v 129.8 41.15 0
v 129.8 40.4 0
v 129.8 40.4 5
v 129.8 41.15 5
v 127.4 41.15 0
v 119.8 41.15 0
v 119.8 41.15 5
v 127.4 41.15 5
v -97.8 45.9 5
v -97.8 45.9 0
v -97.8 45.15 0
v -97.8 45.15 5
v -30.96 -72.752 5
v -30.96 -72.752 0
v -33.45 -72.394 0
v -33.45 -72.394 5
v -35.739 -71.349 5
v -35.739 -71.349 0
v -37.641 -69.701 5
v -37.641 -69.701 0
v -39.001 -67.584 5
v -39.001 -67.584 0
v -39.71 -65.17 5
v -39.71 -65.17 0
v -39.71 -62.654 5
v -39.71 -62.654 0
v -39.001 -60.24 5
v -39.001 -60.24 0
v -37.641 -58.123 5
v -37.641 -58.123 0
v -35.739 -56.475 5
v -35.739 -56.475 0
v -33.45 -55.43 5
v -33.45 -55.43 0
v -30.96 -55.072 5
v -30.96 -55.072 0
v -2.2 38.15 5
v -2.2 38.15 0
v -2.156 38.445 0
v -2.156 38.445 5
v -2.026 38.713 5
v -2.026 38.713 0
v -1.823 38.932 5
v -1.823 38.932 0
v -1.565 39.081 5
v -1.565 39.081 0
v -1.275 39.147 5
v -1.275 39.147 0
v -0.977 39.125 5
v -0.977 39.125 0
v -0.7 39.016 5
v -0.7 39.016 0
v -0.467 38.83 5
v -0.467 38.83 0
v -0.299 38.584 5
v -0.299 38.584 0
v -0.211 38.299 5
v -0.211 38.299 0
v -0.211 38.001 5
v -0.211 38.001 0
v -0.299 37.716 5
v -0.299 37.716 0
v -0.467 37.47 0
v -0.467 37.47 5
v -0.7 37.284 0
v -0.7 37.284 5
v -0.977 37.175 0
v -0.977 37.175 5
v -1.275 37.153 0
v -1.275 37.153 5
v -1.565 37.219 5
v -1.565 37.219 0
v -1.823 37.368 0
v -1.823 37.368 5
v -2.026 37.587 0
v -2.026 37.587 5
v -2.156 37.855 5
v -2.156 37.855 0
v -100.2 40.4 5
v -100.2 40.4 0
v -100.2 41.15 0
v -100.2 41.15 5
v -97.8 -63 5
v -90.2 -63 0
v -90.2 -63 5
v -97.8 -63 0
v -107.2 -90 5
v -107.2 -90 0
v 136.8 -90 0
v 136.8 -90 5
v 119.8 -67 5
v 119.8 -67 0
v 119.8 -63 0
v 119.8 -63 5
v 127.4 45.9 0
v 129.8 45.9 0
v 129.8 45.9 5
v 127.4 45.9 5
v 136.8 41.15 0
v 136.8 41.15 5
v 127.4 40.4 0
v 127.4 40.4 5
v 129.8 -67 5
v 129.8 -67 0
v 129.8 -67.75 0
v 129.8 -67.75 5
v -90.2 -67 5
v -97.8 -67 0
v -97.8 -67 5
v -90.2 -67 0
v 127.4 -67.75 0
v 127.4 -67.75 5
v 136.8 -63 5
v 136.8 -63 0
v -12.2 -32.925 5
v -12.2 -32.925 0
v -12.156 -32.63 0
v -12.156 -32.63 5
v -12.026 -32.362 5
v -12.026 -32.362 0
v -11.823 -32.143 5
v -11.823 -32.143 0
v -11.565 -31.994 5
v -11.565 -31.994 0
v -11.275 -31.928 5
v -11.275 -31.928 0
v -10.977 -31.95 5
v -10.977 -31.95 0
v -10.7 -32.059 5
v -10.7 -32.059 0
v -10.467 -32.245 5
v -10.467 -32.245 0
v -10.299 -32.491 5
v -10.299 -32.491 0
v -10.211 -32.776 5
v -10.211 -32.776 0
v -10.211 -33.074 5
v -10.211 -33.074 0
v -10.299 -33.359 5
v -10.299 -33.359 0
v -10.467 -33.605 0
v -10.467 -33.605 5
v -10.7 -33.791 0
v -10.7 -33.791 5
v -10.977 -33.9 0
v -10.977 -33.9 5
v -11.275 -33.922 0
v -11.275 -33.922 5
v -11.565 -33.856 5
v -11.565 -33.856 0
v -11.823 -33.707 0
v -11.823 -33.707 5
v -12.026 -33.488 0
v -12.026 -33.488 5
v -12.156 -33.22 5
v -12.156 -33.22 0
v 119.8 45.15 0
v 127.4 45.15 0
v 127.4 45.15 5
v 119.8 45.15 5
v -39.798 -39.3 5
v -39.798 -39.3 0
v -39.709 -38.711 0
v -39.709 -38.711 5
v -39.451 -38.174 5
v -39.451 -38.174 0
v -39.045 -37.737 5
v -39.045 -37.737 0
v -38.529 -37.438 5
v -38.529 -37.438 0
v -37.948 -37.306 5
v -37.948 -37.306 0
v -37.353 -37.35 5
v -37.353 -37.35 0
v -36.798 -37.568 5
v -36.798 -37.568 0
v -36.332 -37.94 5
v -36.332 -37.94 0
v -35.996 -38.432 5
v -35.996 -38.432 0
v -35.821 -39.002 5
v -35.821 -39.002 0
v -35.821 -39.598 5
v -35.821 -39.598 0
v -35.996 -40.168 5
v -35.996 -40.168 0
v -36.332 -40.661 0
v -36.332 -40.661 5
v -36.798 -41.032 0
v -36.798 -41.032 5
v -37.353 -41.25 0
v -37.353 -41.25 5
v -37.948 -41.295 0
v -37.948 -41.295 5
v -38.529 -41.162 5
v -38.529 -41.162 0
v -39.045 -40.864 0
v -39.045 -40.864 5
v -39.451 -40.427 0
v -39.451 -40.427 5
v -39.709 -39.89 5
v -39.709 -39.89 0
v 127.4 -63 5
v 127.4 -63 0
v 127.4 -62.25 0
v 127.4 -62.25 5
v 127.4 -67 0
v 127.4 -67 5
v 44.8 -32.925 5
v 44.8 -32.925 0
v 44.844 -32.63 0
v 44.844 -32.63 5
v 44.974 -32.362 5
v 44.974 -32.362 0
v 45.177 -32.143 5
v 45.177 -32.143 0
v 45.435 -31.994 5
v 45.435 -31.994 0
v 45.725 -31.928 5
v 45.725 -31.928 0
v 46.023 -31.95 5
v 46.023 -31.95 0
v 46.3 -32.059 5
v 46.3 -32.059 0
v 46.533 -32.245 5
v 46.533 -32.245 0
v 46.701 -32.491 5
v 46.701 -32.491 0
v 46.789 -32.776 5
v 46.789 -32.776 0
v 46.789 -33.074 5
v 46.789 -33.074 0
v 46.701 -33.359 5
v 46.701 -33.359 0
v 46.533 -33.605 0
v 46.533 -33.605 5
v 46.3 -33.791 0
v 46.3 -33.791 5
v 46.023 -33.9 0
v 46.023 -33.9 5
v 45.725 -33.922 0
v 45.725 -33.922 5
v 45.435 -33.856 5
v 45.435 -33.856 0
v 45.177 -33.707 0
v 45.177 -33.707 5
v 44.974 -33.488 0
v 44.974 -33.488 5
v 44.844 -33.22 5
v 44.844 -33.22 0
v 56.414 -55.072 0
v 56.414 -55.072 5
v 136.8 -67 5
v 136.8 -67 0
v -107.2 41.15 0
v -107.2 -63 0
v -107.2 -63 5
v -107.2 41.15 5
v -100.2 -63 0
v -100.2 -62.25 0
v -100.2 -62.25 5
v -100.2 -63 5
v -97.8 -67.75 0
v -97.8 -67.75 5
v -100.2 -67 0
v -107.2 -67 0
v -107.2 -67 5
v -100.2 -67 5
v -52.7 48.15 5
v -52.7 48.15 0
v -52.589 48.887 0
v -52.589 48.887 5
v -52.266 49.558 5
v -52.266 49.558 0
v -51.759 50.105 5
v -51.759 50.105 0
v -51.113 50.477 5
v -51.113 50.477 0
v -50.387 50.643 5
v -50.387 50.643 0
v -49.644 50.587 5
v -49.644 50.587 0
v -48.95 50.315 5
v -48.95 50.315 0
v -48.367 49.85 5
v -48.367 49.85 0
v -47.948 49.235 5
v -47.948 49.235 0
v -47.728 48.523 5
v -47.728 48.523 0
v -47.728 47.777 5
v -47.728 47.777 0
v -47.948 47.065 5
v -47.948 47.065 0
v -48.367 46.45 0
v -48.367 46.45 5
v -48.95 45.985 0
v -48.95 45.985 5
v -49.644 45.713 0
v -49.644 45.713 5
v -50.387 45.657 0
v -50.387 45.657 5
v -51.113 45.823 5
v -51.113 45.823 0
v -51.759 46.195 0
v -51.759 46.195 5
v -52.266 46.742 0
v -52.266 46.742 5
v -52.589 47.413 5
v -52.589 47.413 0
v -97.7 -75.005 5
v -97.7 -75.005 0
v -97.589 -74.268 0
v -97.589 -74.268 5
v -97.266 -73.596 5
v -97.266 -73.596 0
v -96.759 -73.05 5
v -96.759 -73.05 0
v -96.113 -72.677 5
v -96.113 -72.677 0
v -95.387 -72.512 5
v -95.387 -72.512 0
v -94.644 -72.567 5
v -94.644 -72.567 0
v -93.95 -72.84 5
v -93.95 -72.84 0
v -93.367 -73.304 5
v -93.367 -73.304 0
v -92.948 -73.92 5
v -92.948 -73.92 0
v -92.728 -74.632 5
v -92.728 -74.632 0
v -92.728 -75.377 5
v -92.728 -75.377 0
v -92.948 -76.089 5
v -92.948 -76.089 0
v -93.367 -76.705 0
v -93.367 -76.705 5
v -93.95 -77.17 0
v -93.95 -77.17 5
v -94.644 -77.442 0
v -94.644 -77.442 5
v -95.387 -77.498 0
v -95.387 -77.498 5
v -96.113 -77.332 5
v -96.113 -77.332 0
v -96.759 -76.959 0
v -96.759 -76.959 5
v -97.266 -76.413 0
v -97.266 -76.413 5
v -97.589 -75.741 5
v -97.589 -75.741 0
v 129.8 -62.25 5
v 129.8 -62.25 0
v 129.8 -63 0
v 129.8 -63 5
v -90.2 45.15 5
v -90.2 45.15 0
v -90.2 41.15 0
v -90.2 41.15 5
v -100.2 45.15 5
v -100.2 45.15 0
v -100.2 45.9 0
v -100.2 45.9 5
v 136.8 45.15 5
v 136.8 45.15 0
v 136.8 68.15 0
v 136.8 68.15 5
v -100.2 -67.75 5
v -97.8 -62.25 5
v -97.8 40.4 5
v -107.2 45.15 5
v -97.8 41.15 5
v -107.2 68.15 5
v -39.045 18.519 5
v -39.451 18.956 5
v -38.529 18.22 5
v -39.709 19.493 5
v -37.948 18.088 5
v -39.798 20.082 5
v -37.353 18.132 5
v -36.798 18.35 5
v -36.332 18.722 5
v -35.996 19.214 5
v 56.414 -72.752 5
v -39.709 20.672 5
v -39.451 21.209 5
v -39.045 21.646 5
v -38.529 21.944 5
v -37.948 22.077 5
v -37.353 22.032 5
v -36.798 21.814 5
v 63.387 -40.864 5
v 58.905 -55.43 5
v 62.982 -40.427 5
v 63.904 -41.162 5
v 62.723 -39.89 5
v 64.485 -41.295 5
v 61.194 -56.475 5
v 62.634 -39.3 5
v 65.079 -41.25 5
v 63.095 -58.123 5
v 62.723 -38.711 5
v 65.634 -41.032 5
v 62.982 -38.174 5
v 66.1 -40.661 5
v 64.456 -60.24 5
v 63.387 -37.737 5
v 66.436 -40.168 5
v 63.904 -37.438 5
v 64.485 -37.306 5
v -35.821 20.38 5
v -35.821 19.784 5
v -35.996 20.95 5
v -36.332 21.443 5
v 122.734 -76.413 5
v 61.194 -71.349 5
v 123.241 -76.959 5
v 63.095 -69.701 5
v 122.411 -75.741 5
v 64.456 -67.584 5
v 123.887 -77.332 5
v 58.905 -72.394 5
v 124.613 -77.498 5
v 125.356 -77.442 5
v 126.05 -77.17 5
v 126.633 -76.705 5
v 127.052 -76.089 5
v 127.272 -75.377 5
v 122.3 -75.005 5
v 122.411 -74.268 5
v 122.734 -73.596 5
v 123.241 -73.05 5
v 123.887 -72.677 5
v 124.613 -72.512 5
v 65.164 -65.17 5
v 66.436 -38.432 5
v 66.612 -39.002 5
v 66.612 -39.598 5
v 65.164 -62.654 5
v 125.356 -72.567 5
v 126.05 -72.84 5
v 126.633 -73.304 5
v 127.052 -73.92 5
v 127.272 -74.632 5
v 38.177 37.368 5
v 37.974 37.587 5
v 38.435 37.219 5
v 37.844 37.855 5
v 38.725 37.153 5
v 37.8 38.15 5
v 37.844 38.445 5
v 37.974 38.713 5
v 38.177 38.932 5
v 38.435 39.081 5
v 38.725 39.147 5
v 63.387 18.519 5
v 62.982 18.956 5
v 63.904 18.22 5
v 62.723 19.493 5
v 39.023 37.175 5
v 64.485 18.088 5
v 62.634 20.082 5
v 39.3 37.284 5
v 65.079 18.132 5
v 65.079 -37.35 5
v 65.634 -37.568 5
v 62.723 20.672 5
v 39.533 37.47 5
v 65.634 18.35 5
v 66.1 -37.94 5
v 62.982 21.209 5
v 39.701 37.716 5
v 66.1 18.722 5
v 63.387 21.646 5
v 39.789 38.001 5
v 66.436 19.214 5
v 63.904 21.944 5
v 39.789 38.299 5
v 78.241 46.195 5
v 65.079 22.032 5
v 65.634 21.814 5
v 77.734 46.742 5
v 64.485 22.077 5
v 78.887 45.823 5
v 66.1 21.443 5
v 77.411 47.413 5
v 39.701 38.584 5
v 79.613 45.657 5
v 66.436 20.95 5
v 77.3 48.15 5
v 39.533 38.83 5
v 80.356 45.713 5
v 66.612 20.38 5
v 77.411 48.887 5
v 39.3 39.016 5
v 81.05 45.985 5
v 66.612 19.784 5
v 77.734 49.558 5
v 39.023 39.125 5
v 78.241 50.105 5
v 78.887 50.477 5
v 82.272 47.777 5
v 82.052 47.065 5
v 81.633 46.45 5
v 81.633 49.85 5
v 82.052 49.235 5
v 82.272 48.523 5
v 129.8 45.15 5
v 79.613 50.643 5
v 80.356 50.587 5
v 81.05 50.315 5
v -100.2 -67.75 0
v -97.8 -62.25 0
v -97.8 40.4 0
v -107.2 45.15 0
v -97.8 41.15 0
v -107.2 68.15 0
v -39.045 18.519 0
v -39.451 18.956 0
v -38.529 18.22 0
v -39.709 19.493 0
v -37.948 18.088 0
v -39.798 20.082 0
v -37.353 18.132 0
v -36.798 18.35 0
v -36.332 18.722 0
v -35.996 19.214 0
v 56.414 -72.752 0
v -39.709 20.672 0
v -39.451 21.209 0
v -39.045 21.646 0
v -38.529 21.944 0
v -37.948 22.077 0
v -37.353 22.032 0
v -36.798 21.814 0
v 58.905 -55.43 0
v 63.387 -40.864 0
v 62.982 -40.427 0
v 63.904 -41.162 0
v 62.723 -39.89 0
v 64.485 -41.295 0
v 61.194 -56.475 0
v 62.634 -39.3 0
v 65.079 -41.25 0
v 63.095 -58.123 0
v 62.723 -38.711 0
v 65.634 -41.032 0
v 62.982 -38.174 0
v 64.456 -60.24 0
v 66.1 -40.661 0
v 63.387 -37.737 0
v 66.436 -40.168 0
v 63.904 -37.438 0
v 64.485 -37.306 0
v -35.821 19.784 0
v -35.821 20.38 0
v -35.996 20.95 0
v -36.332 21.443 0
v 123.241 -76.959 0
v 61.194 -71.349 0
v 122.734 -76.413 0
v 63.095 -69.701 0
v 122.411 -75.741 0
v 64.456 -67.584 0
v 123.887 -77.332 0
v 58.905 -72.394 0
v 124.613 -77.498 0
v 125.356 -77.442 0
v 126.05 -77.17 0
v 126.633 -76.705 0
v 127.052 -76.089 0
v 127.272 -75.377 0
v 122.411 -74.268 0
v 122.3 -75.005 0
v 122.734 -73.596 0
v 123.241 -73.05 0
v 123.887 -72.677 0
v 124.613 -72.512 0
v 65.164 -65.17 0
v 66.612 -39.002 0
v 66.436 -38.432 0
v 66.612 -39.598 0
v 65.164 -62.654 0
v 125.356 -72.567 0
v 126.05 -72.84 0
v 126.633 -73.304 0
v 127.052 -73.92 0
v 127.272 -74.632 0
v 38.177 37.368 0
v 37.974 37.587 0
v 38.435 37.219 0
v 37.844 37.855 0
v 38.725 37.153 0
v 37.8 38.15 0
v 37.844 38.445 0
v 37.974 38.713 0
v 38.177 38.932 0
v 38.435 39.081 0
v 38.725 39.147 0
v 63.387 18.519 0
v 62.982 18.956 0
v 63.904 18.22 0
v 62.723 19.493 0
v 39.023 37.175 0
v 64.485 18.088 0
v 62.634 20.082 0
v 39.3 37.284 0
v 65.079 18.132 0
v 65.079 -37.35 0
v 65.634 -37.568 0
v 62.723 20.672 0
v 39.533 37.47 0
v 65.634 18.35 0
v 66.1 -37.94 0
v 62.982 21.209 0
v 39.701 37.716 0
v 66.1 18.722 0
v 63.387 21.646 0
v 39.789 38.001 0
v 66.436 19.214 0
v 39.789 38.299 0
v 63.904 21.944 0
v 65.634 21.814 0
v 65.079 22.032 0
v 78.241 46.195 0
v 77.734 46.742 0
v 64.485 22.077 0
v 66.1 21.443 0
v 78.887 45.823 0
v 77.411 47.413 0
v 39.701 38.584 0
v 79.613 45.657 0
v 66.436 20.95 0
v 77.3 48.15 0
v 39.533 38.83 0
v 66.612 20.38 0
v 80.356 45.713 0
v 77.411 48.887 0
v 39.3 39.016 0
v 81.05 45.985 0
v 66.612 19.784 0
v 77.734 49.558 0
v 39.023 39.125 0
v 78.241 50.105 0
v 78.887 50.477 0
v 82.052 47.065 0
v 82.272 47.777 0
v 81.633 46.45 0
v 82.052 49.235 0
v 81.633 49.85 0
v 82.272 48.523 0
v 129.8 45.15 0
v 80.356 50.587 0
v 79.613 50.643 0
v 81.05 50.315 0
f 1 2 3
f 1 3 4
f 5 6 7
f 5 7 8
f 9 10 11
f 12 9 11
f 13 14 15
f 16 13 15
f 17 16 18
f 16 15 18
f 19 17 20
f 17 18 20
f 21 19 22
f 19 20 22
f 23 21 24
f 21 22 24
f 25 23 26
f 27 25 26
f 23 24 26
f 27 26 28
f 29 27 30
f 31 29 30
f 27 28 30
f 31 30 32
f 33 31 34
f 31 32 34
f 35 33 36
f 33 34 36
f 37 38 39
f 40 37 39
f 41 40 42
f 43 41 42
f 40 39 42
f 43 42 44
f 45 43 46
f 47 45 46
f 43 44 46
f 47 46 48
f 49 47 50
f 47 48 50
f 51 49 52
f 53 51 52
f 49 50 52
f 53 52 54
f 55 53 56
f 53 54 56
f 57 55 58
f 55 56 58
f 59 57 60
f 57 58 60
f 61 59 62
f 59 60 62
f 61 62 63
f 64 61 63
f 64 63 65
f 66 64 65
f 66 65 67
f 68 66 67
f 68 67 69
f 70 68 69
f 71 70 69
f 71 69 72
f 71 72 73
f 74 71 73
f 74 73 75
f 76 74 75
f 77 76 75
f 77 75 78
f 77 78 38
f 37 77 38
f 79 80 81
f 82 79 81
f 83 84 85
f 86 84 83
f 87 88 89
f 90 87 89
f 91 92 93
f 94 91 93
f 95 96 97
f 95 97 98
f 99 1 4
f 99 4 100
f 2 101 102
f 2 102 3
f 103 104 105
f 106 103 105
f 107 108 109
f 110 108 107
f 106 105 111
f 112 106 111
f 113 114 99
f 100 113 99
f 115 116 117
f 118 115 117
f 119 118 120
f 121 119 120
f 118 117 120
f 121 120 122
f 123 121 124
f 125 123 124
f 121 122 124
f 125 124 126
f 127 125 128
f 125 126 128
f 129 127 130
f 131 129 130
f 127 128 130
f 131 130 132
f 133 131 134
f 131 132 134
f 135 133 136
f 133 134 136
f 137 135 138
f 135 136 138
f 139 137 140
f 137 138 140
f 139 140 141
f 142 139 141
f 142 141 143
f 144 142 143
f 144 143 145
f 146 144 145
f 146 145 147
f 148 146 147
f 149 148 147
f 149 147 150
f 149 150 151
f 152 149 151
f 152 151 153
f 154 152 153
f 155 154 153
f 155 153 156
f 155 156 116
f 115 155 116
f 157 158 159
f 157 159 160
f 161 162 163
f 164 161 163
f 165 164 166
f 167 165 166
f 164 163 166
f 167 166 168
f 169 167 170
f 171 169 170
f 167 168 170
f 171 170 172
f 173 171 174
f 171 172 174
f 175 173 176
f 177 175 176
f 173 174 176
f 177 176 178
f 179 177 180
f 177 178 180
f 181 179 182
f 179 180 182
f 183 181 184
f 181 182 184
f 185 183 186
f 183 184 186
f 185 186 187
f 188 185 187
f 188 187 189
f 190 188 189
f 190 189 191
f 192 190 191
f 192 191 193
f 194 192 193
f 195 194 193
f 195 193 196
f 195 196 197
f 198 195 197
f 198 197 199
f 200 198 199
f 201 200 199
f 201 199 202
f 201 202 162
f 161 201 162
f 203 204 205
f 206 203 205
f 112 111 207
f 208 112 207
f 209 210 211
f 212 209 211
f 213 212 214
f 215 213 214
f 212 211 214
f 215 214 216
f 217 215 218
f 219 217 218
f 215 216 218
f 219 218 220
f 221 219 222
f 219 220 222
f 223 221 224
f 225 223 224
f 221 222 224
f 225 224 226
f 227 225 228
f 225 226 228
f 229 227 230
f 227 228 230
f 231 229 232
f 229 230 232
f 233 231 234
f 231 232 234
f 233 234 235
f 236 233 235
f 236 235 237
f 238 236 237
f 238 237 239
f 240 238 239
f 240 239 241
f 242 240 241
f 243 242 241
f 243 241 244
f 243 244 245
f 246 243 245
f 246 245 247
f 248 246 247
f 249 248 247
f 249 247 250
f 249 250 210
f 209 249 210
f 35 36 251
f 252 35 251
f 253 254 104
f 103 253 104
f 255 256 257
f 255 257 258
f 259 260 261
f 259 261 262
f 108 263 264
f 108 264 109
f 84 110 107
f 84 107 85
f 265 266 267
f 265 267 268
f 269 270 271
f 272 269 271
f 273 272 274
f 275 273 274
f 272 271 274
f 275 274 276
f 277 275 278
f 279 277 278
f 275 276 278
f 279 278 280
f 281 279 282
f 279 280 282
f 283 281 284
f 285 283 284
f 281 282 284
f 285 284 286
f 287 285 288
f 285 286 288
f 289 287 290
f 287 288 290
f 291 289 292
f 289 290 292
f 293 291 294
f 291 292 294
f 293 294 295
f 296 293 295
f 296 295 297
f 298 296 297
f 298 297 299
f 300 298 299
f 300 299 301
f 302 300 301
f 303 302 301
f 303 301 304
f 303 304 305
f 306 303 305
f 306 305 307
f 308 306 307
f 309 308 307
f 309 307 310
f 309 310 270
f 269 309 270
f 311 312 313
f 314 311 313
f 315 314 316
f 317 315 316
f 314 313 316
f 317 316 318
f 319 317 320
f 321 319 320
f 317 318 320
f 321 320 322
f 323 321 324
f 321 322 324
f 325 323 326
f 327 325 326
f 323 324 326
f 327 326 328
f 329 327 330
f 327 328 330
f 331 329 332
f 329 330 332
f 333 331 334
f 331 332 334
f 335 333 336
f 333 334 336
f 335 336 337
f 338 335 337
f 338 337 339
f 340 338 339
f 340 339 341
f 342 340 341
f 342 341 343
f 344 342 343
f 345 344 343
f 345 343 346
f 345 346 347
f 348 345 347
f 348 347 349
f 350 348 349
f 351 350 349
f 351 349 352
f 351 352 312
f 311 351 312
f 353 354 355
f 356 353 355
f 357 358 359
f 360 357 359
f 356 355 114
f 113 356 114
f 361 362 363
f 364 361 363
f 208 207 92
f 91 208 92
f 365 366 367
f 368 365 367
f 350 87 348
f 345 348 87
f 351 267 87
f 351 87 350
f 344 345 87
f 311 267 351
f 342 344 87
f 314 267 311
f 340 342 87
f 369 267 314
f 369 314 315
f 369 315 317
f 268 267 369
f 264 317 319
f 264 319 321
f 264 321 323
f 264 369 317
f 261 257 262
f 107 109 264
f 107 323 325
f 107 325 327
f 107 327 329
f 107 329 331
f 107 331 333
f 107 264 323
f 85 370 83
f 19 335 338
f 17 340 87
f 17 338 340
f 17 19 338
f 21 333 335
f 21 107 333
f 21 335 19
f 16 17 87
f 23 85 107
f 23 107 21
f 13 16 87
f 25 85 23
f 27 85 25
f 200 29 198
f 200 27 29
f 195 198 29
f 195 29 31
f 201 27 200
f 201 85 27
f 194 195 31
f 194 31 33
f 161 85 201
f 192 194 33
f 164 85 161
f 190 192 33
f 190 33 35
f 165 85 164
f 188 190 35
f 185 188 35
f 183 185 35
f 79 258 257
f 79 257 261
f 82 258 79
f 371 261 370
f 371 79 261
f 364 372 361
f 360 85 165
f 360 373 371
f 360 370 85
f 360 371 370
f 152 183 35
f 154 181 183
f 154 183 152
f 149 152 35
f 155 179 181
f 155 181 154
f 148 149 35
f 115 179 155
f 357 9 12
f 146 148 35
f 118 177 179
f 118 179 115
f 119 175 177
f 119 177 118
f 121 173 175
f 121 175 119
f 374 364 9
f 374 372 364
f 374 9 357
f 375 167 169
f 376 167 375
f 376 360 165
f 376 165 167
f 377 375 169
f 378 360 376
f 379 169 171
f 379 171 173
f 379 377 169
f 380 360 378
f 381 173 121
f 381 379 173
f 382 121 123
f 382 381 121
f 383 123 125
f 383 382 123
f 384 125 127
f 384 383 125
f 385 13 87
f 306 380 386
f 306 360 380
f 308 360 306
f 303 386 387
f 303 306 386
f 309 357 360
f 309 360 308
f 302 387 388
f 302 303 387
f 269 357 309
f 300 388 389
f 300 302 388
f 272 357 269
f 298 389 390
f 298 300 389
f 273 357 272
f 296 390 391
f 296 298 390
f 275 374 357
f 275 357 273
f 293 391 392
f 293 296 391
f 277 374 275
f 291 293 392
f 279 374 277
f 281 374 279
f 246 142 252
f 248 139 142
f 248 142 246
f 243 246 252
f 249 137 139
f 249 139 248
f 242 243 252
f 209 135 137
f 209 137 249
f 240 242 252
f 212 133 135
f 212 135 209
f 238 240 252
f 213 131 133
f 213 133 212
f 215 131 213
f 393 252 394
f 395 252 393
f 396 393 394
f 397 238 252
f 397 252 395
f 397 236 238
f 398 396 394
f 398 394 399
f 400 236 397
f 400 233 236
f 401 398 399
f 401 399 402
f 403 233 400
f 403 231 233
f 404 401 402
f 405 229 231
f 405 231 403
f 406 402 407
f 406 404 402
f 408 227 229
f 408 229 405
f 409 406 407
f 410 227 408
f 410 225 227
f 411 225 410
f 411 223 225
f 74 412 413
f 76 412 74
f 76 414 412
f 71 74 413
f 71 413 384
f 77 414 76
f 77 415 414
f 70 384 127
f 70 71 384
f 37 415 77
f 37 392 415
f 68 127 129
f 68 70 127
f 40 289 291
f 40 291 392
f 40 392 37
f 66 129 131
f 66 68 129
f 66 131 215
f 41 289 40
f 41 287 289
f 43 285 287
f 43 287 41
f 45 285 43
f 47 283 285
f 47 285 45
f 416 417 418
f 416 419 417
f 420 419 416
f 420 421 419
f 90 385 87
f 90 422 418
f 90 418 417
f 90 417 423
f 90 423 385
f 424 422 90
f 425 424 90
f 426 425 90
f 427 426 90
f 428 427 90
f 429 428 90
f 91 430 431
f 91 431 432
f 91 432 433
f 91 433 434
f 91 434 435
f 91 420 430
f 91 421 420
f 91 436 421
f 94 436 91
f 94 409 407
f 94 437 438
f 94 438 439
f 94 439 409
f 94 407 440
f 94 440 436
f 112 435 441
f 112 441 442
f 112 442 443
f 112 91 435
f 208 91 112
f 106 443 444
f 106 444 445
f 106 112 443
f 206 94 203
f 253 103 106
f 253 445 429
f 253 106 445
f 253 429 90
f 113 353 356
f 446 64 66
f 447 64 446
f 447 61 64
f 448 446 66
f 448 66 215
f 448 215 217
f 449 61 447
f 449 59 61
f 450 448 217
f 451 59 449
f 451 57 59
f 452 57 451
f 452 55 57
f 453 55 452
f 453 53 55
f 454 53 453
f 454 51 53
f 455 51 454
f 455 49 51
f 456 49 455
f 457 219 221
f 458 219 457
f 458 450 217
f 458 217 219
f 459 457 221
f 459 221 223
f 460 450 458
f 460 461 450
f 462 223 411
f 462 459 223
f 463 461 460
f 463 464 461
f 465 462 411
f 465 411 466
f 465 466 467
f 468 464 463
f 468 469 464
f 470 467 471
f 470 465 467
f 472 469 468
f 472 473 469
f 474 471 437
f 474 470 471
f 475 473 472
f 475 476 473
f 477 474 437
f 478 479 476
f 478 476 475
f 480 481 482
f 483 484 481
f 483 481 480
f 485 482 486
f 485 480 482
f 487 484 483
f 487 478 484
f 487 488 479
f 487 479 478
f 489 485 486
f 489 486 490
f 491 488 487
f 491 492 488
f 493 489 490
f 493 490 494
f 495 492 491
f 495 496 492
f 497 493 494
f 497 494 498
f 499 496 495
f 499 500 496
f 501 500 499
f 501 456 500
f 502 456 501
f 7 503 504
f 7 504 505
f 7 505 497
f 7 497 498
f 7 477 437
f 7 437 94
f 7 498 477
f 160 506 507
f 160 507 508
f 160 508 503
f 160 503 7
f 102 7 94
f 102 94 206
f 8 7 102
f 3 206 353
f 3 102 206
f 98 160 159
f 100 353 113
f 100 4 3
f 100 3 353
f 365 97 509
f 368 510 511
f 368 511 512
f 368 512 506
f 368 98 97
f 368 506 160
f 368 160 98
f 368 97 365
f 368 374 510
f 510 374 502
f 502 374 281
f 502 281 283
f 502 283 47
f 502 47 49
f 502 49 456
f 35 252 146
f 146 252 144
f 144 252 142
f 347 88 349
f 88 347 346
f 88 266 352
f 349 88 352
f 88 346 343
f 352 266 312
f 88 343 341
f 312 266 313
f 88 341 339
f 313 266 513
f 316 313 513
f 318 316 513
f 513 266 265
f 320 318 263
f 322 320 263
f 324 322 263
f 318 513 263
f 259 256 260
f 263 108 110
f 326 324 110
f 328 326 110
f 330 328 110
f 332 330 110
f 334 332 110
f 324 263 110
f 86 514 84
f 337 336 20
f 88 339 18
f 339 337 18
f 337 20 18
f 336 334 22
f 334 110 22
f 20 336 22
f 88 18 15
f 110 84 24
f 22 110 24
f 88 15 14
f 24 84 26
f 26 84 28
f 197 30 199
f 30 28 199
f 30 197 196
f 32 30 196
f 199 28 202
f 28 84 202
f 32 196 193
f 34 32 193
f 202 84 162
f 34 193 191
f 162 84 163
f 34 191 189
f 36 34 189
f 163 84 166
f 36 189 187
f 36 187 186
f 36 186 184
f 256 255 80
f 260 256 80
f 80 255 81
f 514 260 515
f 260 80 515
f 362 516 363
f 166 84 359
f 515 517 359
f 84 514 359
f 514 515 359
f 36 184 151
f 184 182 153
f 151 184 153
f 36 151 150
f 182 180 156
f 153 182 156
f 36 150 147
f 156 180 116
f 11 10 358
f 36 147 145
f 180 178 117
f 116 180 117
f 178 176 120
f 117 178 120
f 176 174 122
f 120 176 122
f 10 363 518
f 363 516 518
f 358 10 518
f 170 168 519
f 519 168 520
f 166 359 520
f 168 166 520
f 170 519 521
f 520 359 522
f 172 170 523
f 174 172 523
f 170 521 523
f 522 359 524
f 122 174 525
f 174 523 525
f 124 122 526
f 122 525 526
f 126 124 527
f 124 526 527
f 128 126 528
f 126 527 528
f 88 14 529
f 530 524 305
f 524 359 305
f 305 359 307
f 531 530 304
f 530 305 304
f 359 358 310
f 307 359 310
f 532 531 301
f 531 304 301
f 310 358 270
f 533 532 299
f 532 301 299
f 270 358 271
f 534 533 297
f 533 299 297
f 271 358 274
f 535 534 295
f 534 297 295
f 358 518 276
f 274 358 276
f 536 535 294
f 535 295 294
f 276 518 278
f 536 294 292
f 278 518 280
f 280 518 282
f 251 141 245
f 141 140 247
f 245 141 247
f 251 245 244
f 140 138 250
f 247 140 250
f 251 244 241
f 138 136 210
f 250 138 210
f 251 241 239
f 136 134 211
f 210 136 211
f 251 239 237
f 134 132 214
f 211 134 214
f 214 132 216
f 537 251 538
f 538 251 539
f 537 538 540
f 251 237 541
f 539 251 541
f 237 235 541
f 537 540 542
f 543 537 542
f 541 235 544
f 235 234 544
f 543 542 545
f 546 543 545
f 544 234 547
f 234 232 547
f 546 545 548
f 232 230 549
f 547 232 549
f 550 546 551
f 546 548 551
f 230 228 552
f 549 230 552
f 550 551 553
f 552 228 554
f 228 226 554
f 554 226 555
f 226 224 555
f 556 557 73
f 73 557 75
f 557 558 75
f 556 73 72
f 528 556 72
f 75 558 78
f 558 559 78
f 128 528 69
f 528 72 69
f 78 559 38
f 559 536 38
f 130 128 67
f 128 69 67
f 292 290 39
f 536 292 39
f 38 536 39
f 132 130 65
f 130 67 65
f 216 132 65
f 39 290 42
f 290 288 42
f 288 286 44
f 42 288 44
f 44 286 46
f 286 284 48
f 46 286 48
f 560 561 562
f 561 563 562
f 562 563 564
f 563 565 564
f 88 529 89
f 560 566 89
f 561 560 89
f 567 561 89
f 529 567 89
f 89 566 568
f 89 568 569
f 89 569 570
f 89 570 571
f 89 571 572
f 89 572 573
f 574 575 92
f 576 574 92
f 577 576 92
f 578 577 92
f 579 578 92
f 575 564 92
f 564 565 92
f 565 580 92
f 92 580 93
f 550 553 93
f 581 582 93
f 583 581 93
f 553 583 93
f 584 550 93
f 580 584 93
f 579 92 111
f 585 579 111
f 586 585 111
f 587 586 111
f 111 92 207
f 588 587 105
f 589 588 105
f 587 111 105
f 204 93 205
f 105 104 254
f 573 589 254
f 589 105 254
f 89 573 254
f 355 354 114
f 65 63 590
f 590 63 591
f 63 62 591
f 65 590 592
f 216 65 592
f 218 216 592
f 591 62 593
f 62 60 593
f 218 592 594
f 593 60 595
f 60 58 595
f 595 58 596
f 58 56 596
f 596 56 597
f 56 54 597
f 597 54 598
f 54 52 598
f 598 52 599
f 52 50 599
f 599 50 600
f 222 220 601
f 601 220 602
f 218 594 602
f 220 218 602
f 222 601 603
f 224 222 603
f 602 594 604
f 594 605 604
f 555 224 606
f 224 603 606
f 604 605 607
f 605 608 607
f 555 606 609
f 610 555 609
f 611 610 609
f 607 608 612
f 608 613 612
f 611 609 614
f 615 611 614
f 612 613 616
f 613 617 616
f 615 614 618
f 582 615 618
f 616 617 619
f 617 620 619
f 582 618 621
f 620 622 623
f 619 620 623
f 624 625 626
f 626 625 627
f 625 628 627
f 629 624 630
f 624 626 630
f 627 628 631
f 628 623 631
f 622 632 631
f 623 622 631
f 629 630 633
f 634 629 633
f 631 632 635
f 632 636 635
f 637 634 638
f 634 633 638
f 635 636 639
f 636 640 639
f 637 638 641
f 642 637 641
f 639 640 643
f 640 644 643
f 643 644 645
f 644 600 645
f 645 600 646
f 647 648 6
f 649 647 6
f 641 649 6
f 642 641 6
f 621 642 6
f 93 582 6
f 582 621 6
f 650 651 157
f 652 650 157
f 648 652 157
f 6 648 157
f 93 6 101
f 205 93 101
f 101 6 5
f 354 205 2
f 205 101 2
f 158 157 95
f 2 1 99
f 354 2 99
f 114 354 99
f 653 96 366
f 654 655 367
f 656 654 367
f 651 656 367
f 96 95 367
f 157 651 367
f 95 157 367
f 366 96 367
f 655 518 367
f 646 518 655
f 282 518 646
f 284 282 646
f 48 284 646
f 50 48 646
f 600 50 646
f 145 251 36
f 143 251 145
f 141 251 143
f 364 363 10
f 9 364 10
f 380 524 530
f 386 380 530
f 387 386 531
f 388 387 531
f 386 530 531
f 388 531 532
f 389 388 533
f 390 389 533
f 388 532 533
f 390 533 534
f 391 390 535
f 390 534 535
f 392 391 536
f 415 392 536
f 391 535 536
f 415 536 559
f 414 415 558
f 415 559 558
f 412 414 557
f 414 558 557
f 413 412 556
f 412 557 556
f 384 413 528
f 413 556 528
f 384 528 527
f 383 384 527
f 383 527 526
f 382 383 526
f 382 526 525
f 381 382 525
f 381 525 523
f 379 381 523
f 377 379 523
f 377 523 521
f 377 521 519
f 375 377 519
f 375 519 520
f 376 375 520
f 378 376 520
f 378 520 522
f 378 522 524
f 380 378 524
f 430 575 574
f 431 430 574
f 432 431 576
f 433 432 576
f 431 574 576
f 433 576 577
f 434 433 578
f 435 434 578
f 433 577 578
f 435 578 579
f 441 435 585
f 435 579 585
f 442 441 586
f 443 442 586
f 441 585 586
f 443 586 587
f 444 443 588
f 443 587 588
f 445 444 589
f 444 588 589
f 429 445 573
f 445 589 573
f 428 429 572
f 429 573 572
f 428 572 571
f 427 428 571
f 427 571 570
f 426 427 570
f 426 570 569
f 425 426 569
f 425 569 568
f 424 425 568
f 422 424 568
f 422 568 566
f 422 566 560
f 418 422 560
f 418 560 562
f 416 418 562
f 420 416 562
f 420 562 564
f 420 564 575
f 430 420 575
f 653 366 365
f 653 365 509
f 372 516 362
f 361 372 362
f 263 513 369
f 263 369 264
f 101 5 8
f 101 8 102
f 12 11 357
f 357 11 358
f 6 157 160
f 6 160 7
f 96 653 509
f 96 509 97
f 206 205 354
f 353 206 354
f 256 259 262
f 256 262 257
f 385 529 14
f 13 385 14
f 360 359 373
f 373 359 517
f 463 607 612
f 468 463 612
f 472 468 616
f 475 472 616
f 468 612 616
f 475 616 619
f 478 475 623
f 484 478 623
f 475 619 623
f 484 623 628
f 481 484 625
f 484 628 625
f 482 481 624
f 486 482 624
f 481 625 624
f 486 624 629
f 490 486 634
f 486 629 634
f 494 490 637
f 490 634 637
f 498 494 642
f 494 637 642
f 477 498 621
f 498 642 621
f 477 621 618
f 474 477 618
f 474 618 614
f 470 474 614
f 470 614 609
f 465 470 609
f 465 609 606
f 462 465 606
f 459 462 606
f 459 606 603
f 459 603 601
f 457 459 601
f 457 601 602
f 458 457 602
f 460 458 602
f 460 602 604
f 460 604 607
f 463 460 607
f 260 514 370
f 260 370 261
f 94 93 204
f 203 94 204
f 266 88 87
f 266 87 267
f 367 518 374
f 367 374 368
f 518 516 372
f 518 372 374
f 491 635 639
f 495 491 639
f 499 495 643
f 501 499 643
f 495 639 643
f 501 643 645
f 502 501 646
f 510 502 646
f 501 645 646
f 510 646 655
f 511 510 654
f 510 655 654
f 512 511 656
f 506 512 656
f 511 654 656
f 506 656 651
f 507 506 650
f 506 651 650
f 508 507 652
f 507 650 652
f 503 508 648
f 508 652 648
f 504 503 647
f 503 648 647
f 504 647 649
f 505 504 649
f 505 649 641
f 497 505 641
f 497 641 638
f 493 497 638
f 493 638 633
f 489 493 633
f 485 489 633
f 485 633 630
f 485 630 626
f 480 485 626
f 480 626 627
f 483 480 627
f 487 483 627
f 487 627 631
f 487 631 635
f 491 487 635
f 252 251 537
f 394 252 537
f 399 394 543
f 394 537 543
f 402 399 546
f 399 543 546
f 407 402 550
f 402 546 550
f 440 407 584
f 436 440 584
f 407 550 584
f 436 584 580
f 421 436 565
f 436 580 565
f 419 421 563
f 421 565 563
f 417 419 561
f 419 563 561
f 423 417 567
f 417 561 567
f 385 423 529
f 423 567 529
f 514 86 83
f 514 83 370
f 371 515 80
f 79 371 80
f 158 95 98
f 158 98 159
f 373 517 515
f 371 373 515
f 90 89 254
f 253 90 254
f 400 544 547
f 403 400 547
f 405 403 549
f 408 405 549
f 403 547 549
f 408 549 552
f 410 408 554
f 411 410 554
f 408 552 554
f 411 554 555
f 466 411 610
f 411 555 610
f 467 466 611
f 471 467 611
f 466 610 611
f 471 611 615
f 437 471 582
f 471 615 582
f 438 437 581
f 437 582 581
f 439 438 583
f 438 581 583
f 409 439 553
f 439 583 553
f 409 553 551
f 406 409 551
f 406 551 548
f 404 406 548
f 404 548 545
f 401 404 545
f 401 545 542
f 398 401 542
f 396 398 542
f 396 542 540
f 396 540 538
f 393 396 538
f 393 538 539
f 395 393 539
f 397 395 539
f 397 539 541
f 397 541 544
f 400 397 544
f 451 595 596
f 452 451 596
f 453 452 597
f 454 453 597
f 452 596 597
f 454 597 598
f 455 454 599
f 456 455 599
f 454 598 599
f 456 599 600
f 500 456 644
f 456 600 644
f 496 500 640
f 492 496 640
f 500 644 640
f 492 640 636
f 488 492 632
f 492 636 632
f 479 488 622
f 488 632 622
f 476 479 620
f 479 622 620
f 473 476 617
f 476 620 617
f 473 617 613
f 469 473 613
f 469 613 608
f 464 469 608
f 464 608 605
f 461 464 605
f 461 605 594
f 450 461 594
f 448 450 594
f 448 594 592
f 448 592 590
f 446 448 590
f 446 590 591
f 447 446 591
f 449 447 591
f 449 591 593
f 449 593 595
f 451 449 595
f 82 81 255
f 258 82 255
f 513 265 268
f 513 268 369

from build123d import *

# Parameters (mm, degrees)
SKETCH1_W           = 244
SKETCH1_H           = 158.15
BOSS_EXTRUDE1_DEPTH = 5
CUT_EXTRUDE1_DEPTH  = 10
SKETCH3_R           = 2.5
CUT_EXTRUDE2_DEPTH  = 10
SKETCH4_R           = 1
CUT_EXTRUDE3_DEPTH  = 10
SKETCH5_R           = 2
CUT_EXTRUDE4_DEPTH  = 10
CUT_EXTRUDE5_DEPTH  = 10


with BuildPart() as part:
    # Sketch1 → Boss-Extrude1 (new body)
    with BuildSketch(Plane.XY):
        with Locations((14.8, -10.925)):
            Rectangle(SKETCH1_W, SKETCH1_H)
    extrude(amount=BOSS_EXTRUDE1_DEPTH)

    # Sketch2 → Cut-Extrude1 (cut)
    with BuildSketch(Plane(origin=(0, 0, 0), x_dir=(-1, 0, 0), z_dir=(0, 0, -1))):
        Polygon((-136.8, 45.15), (-129.8, 45.15), (-129.8, 45.9), (-127.4, 45.9), (-127.4, 45.15), (-119.8, 45.15), (-119.8, 41.15), (-127.4, 41.15), (-127.4, 40.4), (-129.8, 40.4), (-129.8, 41.15), (-136.8, 41.15), align=None)
        Polygon((-129.8, -63), (-136.8, -63), (-136.8, -67), (-129.8, -67), (-129.8, -67.75), (-127.4, -67.75), (-127.4, -67), (-119.8, -67), (-119.8, -63), (-127.4, -63), (-127.4, -62.25), (-129.8, -62.25), align=None)
        Polygon((100.2, 41.15), (107.2, 41.15), (107.2, 45.15), (100.2, 45.15), (100.2, 45.9), (97.8, 45.9), (97.8, 45.15), (90.2, 45.15), (90.2, 41.15), (97.8, 41.15), (97.8, 40.4), (100.2, 40.4), align=None)
        Polygon((107.2, -67), (100.2, -67), (100.2, -67.75), (97.8, -67.75), (97.8, -67), (90.2, -67), (90.2, -63), (97.8, -63), (97.8, -62.25), (100.2, -62.25), (100.2, -63), (107.2, -63), align=None)
    extrude(amount=-CUT_EXTRUDE1_DEPTH, mode=Mode.SUBTRACT)

    # Sketch3 → Cut-Extrude2 (cut)
    with BuildSketch(Plane(origin=(0, 0, 0), x_dir=(-1, 0, 0), z_dir=(0, 0, -1))):
        with Locations((-124.8, -75.004567899)):
            Circle(SKETCH3_R)
        with Locations((-79.8, 48.15)):
            Circle(SKETCH3_R)
        with Locations((95.2, -75.004567899)):
            Circle(SKETCH3_R)
        with Locations((50.2, 48.15)):
            Circle(SKETCH3_R)
    extrude(amount=-CUT_EXTRUDE2_DEPTH, mode=Mode.SUBTRACT)

    # Sketch4 → Cut-Extrude3 (cut)
    with BuildSketch(Plane(origin=(0, 0, 0), x_dir=(-1, 0, 0), z_dir=(0, 0, -1))):
        with Locations((-38.8, 38.15)):
            Circle(SKETCH4_R)
        with Locations((1.2, 38.15)):
            Circle(SKETCH4_R)
        with Locations((-45.8, -32.925)):
            Circle(SKETCH4_R)
        with Locations((11.2, -32.925)):
            Circle(SKETCH4_R)
    extrude(amount=-CUT_EXTRUDE3_DEPTH, mode=Mode.SUBTRACT)

    # Sketch5 → Cut-Extrude4 (cut)
    with BuildSketch(Plane(origin=(0, 0, 0), x_dir=(-1, 0, 0), z_dir=(0, 0, -1))):
        with Locations((-64.634291995, 20.08216582)):
            Circle(SKETCH5_R)
        with Locations((37.798280732, 20.08216582)):
            Circle(SKETCH5_R)
        with Locations((37.798280732, -39.300167224)):
            Circle(SKETCH5_R)
        with Locations((-64.634291995, -39.300167224)):
            Circle(SKETCH5_R)
    extrude(amount=-CUT_EXTRUDE4_DEPTH, mode=Mode.SUBTRACT)

    # Sketch6 → Cut-Extrude5 (cut)
    with BuildSketch(Plane(origin=(0, 0, 0), x_dir=(-1, 0, 0), z_dir=(0, 0, -1))):
        with BuildLine():
            Line((-56.414434421, -72.751869016), (30.959965679, -72.751869016))
            ThreePointArc((30.959965679, -72.751869016), (39.799882323, -63.911952372), (30.959965679, -55.072035728))
            Line((30.959965679, -55.072035728), (-56.414434421, -55.072035728))
            ThreePointArc((-56.414434421, -55.072035728), (-65.254351065, -63.911952372), (-56.414434421, -72.751869016))
        make_face()
    extrude(amount=-CUT_EXTRUDE5_DEPTH, mode=Mode.SUBTRACT)


solid = part.part
